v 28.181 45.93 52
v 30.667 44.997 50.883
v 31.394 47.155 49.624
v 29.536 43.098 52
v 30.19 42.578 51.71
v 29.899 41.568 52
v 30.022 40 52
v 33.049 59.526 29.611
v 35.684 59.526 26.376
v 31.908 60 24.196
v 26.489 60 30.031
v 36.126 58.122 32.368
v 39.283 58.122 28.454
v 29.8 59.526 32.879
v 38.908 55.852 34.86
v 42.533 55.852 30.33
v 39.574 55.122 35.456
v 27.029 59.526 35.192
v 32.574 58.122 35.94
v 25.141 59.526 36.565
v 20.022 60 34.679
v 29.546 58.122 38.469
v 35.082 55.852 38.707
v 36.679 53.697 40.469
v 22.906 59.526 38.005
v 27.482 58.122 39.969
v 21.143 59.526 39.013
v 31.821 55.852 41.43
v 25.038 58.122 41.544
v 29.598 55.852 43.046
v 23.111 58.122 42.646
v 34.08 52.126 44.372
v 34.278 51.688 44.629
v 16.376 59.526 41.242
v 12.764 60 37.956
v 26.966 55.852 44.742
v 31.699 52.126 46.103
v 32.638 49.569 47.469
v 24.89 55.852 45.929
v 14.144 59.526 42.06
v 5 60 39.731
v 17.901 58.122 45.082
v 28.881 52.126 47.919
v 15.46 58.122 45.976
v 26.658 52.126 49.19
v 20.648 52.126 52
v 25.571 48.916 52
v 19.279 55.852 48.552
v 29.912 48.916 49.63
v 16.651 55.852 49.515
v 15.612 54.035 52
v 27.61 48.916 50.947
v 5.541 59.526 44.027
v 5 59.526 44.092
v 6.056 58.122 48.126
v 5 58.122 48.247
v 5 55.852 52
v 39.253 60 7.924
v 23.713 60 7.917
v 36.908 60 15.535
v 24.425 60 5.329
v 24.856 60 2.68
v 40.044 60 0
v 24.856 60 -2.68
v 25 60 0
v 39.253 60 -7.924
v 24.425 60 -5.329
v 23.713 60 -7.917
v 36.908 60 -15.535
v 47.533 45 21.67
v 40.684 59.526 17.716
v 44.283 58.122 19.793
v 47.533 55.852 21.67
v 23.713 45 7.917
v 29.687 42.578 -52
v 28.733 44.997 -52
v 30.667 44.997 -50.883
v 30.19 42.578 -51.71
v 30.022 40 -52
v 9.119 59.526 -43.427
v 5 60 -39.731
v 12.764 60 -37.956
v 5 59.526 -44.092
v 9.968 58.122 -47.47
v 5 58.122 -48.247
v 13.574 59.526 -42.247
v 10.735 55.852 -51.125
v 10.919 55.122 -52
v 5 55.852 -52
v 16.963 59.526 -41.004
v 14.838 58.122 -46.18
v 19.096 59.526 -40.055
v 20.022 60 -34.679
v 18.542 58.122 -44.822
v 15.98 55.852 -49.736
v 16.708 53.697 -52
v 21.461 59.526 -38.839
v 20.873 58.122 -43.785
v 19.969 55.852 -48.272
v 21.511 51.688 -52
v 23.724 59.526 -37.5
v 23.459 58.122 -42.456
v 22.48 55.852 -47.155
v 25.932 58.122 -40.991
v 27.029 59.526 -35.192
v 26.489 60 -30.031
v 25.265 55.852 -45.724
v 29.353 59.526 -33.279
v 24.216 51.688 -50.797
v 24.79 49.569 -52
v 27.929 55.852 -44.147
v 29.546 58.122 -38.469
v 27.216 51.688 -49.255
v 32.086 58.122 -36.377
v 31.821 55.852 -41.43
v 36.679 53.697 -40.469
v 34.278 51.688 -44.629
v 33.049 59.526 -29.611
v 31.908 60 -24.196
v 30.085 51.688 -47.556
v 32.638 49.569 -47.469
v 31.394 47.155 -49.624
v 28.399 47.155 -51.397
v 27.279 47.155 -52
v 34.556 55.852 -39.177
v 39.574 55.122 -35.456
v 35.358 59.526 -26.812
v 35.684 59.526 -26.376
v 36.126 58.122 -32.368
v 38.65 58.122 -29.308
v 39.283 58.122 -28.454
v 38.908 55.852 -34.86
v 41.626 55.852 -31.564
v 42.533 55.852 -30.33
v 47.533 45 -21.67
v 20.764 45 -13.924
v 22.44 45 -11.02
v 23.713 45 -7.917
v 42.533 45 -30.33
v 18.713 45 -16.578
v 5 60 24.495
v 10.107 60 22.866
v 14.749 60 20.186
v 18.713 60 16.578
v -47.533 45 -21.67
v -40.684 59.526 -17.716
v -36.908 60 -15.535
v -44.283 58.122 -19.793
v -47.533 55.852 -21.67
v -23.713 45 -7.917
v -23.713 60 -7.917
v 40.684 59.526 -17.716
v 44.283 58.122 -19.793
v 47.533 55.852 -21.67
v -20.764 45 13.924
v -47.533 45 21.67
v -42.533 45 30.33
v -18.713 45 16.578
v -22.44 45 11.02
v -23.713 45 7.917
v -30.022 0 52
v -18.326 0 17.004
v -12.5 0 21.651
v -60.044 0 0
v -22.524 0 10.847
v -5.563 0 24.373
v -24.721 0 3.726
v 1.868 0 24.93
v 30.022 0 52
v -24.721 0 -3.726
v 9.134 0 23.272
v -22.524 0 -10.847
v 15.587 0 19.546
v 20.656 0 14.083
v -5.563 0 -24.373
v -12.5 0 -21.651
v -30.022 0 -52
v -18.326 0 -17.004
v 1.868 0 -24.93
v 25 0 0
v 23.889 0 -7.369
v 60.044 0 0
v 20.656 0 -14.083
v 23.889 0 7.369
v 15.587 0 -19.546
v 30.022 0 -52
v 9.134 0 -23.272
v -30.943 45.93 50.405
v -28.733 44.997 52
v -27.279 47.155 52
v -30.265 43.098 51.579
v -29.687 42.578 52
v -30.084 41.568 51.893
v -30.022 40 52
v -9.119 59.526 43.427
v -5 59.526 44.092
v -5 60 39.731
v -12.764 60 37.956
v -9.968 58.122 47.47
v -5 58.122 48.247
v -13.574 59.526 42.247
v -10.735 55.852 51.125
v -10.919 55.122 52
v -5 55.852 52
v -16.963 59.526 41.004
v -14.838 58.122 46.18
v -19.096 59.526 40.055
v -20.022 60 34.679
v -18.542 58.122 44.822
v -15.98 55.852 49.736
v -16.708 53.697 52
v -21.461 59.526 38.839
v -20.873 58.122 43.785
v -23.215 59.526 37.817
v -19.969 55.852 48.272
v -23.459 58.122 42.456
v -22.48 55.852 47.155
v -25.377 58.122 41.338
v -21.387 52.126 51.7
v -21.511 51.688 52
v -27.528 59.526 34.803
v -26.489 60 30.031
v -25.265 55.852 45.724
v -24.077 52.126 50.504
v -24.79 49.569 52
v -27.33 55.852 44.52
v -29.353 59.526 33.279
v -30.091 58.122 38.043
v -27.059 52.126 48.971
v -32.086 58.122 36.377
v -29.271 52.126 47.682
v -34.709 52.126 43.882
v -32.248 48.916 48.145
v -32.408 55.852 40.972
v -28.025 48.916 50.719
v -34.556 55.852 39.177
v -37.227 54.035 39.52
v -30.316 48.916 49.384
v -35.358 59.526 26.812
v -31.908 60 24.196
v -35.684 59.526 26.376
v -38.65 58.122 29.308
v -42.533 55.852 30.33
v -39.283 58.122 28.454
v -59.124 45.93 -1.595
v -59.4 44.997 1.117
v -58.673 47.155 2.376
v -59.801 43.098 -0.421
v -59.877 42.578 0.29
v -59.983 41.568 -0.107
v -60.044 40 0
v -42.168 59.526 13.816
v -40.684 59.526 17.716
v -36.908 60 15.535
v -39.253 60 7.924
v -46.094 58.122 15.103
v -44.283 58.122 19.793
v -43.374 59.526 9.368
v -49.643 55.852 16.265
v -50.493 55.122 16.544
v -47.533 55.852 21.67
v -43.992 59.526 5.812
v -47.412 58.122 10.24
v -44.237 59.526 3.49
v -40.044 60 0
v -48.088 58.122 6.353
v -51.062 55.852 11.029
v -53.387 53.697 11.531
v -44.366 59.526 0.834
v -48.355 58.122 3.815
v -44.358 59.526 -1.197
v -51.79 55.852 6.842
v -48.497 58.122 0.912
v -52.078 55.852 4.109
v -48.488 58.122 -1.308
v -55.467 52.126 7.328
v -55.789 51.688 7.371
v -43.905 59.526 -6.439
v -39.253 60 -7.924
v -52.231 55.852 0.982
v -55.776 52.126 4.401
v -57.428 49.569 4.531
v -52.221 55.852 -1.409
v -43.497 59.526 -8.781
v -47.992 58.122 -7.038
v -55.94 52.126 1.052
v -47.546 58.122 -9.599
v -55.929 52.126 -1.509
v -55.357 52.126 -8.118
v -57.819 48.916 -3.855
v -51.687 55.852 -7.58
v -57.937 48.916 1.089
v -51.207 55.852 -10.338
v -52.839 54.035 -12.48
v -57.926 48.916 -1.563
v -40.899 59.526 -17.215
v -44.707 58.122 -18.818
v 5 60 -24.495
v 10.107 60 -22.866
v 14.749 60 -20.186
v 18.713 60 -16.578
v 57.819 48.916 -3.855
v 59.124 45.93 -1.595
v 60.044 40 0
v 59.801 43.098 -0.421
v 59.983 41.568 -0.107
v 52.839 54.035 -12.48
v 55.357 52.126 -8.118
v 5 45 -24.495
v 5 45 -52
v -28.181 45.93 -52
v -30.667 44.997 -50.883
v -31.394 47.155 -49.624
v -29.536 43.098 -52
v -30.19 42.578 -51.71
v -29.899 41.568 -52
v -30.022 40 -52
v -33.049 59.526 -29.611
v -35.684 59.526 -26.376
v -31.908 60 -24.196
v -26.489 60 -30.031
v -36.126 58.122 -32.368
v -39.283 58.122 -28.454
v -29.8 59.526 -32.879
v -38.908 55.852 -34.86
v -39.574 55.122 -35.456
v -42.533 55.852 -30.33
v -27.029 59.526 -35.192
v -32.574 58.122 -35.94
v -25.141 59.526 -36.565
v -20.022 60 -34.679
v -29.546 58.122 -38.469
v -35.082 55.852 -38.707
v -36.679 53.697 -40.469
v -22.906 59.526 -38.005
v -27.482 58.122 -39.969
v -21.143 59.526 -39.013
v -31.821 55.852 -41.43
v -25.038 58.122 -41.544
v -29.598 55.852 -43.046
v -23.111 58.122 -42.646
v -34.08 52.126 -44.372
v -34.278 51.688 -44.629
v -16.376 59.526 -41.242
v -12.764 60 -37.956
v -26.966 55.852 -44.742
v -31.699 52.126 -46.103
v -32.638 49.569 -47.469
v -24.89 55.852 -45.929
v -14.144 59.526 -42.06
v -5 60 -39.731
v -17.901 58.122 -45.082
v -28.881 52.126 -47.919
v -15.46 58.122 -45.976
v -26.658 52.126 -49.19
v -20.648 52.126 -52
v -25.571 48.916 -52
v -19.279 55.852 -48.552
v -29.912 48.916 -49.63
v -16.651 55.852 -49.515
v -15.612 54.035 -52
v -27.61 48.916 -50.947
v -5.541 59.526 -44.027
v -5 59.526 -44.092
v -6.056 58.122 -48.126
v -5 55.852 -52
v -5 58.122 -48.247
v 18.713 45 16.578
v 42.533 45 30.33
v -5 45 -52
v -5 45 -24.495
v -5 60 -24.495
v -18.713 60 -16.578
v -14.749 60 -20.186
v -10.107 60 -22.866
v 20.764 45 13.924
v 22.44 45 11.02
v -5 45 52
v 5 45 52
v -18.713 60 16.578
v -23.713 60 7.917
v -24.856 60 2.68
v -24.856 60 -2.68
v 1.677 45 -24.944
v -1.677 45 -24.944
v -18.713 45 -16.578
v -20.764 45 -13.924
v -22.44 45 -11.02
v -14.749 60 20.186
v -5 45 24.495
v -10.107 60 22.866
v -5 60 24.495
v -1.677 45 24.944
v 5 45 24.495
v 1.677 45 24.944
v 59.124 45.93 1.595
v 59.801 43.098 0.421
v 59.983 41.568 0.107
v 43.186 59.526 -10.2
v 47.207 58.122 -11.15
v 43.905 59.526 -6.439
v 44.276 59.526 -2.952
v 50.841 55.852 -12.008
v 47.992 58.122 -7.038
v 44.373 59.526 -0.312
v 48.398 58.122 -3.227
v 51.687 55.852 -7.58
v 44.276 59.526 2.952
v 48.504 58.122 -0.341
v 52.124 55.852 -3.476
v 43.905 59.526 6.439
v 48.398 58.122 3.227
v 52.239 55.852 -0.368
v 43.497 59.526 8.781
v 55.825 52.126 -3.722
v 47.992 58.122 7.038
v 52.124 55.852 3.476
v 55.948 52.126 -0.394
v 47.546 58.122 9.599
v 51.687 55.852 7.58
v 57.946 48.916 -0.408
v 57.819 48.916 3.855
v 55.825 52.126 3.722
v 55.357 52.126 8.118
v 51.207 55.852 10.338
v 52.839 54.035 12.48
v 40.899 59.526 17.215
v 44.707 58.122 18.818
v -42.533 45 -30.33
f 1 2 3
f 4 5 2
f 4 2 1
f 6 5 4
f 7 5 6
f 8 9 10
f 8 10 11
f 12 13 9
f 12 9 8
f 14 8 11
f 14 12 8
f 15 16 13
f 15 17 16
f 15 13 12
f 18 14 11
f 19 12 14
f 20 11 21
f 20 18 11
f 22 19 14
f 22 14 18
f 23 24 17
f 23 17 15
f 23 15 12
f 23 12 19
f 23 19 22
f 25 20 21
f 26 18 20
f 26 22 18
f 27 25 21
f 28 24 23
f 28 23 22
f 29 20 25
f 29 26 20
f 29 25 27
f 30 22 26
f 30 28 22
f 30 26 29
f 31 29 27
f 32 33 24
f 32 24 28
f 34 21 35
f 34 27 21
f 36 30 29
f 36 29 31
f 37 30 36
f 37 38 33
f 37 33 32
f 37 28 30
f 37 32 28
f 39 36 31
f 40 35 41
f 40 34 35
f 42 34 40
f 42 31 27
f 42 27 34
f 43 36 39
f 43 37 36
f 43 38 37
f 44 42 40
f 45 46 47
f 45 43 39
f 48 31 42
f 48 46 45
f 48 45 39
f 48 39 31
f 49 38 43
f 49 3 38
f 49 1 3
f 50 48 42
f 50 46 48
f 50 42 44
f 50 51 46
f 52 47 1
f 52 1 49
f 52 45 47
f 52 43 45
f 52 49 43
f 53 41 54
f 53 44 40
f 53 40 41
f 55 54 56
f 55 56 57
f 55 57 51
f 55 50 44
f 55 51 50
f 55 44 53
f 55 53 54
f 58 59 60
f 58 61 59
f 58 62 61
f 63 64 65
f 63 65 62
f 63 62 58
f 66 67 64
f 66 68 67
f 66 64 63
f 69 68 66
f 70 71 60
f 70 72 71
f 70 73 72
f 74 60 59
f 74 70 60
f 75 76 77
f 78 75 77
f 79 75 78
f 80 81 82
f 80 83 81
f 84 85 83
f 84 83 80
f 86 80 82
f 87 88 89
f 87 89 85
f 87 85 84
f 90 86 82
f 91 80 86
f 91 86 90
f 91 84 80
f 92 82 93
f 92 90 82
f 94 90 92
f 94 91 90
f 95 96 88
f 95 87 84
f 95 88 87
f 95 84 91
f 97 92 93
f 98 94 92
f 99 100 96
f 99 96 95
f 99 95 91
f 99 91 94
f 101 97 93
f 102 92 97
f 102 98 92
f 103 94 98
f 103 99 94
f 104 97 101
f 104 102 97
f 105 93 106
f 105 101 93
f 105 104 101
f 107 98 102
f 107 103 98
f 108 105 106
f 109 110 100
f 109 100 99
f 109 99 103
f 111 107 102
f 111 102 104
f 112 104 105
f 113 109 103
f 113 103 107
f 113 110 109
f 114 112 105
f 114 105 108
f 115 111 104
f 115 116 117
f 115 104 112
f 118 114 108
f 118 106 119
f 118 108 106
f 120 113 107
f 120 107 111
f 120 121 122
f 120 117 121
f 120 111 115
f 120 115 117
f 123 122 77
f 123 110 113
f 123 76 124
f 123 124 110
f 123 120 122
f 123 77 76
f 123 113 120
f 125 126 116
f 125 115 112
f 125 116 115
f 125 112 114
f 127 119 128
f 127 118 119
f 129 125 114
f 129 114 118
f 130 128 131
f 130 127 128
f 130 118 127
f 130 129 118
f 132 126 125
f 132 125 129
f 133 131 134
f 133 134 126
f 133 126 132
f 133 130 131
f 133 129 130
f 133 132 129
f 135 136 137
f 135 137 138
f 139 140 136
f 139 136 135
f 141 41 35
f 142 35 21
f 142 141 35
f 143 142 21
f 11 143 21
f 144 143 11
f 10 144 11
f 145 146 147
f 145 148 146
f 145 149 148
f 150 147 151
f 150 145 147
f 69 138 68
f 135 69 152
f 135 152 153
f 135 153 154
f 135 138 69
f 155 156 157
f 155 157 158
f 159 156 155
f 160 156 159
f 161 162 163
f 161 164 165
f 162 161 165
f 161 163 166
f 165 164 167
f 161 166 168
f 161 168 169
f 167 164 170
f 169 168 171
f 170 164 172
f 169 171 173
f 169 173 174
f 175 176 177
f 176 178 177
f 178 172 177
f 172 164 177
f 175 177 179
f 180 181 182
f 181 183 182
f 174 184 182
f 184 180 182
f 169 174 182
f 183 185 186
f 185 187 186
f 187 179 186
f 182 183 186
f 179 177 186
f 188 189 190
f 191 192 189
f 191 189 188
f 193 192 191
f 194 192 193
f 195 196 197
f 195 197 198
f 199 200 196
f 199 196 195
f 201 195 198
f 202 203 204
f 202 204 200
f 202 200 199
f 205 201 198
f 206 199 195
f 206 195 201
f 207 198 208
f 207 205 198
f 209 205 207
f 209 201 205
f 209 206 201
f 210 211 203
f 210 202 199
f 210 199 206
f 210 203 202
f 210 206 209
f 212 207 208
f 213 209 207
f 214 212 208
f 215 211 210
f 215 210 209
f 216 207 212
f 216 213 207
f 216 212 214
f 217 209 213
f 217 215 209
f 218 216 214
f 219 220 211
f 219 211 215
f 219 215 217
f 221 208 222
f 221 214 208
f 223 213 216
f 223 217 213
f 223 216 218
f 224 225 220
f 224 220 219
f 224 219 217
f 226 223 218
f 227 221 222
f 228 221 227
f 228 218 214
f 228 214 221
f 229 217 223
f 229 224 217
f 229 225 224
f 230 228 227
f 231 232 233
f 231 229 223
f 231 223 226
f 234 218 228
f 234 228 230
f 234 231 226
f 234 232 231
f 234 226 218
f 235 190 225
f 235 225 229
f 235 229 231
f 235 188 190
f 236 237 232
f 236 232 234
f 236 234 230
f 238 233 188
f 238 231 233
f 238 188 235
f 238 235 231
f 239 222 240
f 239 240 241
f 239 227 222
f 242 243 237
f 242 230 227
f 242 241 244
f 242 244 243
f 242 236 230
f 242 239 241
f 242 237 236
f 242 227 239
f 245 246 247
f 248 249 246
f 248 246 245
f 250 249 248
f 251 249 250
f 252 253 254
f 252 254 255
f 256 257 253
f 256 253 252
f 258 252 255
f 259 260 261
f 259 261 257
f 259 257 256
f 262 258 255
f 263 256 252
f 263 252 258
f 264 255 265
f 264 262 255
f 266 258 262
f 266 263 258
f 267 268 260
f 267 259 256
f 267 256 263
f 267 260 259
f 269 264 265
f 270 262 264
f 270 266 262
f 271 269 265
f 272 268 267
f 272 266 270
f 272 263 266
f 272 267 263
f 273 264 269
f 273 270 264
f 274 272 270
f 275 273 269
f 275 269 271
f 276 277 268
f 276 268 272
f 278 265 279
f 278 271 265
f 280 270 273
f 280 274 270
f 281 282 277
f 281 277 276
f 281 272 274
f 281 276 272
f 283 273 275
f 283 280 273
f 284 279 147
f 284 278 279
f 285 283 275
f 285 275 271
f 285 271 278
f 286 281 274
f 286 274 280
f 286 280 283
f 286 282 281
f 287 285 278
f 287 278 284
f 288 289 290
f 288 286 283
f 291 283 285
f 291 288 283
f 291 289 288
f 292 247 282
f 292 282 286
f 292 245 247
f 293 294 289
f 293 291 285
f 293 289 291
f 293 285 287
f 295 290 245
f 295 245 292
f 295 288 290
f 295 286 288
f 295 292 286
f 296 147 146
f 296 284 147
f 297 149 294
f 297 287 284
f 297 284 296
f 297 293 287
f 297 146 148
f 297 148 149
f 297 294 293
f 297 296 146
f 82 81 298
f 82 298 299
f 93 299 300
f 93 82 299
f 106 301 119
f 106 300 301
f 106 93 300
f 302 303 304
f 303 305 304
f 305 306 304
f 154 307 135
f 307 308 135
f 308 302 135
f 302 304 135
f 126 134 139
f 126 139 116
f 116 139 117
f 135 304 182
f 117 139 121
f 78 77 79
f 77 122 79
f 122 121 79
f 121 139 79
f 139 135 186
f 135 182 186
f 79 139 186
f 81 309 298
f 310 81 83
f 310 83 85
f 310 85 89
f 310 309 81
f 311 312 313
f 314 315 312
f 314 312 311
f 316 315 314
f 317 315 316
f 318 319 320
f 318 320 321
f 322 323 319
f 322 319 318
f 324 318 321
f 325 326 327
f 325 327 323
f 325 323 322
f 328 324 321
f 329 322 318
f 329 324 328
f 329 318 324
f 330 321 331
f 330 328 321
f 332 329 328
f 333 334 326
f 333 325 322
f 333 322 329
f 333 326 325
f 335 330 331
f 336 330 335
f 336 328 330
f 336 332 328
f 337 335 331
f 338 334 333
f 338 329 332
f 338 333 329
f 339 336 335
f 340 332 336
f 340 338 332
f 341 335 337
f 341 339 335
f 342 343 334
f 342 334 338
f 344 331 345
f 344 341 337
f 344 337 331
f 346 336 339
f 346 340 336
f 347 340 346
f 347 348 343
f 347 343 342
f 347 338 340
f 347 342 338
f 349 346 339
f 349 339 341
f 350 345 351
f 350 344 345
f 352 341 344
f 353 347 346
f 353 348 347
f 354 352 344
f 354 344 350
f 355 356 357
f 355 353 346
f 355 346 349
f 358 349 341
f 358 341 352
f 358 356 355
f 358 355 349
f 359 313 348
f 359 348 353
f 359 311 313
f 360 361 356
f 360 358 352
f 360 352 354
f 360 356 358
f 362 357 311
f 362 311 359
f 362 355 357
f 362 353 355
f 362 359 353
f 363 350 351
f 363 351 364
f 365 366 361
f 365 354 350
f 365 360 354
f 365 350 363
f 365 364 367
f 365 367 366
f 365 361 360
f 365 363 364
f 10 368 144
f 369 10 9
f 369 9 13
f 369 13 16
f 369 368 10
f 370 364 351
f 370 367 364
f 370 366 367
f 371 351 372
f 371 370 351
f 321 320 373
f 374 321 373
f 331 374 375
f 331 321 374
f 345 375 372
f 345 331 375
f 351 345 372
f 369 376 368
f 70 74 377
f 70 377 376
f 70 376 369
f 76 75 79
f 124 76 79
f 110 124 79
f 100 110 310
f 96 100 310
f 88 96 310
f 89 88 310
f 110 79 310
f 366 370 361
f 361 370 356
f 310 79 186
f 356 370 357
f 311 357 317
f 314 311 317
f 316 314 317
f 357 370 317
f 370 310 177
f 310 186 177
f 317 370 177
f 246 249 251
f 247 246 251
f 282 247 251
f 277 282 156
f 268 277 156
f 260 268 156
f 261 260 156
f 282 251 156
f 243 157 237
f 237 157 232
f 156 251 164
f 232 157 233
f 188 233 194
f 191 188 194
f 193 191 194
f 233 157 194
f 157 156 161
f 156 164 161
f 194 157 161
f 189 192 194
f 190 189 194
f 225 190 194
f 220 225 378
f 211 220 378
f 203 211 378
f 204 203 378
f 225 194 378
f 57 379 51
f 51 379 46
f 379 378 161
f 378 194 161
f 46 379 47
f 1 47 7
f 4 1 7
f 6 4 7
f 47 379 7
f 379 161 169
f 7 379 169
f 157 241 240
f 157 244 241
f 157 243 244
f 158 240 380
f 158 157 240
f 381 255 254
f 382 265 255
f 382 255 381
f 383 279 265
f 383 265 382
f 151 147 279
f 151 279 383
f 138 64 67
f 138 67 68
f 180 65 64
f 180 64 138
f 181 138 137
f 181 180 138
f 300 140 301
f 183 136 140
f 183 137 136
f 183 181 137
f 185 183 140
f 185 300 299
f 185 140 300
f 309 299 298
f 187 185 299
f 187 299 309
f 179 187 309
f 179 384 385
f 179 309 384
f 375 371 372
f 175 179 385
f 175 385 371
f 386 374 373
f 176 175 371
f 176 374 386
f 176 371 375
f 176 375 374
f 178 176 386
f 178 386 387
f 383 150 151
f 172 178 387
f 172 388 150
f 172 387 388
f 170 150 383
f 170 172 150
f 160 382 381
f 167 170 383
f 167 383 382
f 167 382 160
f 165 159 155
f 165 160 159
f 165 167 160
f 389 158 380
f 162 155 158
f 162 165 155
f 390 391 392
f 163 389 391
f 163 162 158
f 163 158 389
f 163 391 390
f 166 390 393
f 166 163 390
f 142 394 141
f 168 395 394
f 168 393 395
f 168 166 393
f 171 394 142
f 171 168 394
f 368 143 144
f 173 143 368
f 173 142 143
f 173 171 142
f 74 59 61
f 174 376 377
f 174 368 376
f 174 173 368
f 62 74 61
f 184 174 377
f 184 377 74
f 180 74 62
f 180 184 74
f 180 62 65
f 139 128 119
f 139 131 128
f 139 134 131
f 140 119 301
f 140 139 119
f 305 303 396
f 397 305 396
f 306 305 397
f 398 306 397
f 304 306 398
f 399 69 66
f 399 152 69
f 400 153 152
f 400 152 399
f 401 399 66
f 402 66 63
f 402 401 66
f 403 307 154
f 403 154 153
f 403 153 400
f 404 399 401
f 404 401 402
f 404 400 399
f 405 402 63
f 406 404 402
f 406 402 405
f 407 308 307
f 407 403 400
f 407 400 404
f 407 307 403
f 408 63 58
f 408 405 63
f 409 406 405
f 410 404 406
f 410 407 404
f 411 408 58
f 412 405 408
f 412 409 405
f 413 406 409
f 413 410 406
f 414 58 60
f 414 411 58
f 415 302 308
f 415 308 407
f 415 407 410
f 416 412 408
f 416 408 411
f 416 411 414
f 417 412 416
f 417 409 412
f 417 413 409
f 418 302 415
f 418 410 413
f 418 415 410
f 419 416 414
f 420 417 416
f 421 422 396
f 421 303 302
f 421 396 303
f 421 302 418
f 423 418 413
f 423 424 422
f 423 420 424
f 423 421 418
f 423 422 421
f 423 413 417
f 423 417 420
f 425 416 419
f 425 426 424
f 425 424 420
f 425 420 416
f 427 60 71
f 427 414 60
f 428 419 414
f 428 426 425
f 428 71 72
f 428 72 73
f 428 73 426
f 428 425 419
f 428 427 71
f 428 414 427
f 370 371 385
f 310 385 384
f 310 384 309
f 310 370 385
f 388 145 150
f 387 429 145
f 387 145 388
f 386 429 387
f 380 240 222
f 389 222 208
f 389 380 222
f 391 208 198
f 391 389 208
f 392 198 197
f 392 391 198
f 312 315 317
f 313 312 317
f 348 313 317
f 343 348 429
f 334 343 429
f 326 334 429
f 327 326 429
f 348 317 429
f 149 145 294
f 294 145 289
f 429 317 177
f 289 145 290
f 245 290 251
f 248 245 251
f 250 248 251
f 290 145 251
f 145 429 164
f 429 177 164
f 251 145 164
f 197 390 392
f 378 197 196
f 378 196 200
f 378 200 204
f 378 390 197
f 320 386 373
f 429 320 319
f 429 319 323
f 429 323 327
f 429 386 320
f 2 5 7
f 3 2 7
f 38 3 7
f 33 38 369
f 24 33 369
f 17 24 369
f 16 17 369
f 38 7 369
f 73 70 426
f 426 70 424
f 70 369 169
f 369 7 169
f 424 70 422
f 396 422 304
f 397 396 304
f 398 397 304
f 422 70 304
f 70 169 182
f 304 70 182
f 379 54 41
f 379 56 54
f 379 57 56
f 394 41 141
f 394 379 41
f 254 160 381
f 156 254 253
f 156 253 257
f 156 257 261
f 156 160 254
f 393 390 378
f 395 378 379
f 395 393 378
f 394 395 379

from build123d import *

# Parameters (mm, degrees)
SKETCH1_R           = 25
BOSS_EXTRUDE1_DEPTH = 60
CUT_EXTRUDE1_REACH  = 107
CUT_EXTRUDE1_START  = 45


with BuildPart() as part:
    # Sketch1 → Boss-Extrude1 (new body)
    with BuildSketch(Plane(origin=(0, 0, 0), x_dir=(1, 0, 0), z_dir=(0, 1, 0))):
        Polygon((60.044427996, 0), (30.022213998, 52), (-30.022213998, 52), (-60.044427996, 0), (-30.022213998, -52), (30.022213998, -52), align=None)
        Circle(SKETCH1_R, mode=Mode.SUBTRACT)
    extrude(amount=BOSS_EXTRUDE1_DEPTH)

    # Sketch2 → Cut-Extrude1 (cut, up to next)
    with BuildSketch(Plane(origin=(0, 0, 0), x_dir=(1, 0, 0), z_dir=(0, 1, 0)).offset(CUT_EXTRUDE1_START), mode=Mode.PRIVATE) as cut_extrude1_sk1:
        with BuildLine():
            Line((-47.533320997, -21.669872981), (-42.533320997, -30.330127019))
            Line((-42.533320997, -30.330127019), (-18.713203436, -16.577575733))
            ThreePointArc((-18.713203436, -16.577575733), (-21.650635095, -12.5), (-23.713203436, -7.917321695))
            Line((-23.713203436, -7.917321695), (-47.533320997, -21.669872981))
        make_face()
    cut_extrude1_tool1 = extrude(cut_extrude1_sk1.sketch, amount=CUT_EXTRUDE1_REACH, mode=Mode.PRIVATE) & part.part
    add(cut_extrude1_tool1.solids().sort_by_distance((-33.26901, 45, 19.207872))[0], mode=Mode.SUBTRACT)
    # Sketch2 → Cut-Extrude1 (cut, up to next)
    with BuildSketch(Plane(origin=(0, 0, 0), x_dir=(1, 0, 0), z_dir=(0, 1, 0)).offset(CUT_EXTRUDE1_START), mode=Mode.PRIVATE) as cut_extrude1_sk2:
        with BuildLine():
            Line((-5, -52), (5, -52))
            Line((5, -52), (5, -24.494897428))
            ThreePointArc((5, -24.494897428), (0, -25), (-5, -24.494897428))
            Line((-5, -24.494897428), (-5, -52))
        make_face()
    cut_extrude1_tool2 = extrude(cut_extrude1_sk2.sketch, amount=CUT_EXTRUDE1_REACH, mode=Mode.PRIVATE) & part.part
    add(cut_extrude1_tool2.solids().sort_by_distance((0, 45, 38.415743))[0], mode=Mode.SUBTRACT)
    # Sketch2 → Cut-Extrude1 (cut, up to next)
    with BuildSketch(Plane(origin=(0, 0, 0), x_dir=(1, 0, 0), z_dir=(0, 1, 0)).offset(CUT_EXTRUDE1_START), mode=Mode.PRIVATE) as cut_extrude1_sk3:
        with BuildLine():
            Line((42.533320997, -30.330127019), (47.533320997, -21.669872981))
            Line((47.533320997, -21.669872981), (23.713203436, -7.917321695))
            ThreePointArc((23.713203436, -7.917321695), (21.650635095, -12.5), (18.713203436, -16.577575733))
            Line((18.713203436, -16.577575733), (42.533320997, -30.330127019))
        make_face()
    cut_extrude1_tool3 = extrude(cut_extrude1_sk3.sketch, amount=CUT_EXTRUDE1_REACH, mode=Mode.PRIVATE) & part.part
    add(cut_extrude1_tool3.solids().sort_by_distance((33.26901, 45, 19.207872))[0], mode=Mode.SUBTRACT)
    # Sketch2 → Cut-Extrude1 (cut, up to next)
    with BuildSketch(Plane(origin=(0, 0, 0), x_dir=(1, 0, 0), z_dir=(0, 1, 0)).offset(CUT_EXTRUDE1_START), mode=Mode.PRIVATE) as cut_extrude1_sk4:
        with BuildLine():
            Line((47.533320997, 21.669872981), (42.533320997, 30.330127019))
            Line((42.533320997, 30.330127019), (18.713203436, 16.577575733))
            ThreePointArc((18.713203436, 16.577575733), (21.650635095, 12.5), (23.713203436, 7.917321695))
            Line((23.713203436, 7.917321695), (47.533320997, 21.669872981))
        make_face()
    cut_extrude1_tool4 = extrude(cut_extrude1_sk4.sketch, amount=CUT_EXTRUDE1_REACH, mode=Mode.PRIVATE) & part.part
    add(cut_extrude1_tool4.solids().sort_by_distance((33.26901, 45, -19.207872))[0], mode=Mode.SUBTRACT)
    # Sketch2 → Cut-Extrude1 (cut, up to next)
    with BuildSketch(Plane(origin=(0, 0, 0), x_dir=(1, 0, 0), z_dir=(0, 1, 0)).offset(CUT_EXTRUDE1_START), mode=Mode.PRIVATE) as cut_extrude1_sk5:
        with BuildLine():
            Line((5, 52), (-5, 52))
            Line((-5, 52), (-5, 24.494897428))
            ThreePointArc((-5, 24.494897428), (0, 25), (5, 24.494897428))
            Line((5, 24.494897428), (5, 52))
        make_face()
    cut_extrude1_tool5 = extrude(cut_extrude1_sk5.sketch, amount=CUT_EXTRUDE1_REACH, mode=Mode.PRIVATE) & part.part
    add(cut_extrude1_tool5.solids().sort_by_distance((0, 45, -38.415743))[0], mode=Mode.SUBTRACT)
    # Sketch2 → Cut-Extrude1 (cut, up to next)
    with BuildSketch(Plane(origin=(0, 0, 0), x_dir=(1, 0, 0), z_dir=(0, 1, 0)).offset(CUT_EXTRUDE1_START), mode=Mode.PRIVATE) as cut_extrude1_sk6:
        with BuildLine():
            Line((-42.533320997, 30.330127019), (-47.533320997, 21.669872981))
            Line((-47.533320997, 21.669872981), (-23.713203436, 7.917321695))
            ThreePointArc((-23.713203436, 7.917321695), (-21.650635095, 12.5), (-18.713203436, 16.577575733))
            Line((-18.713203436, 16.577575733), (-42.533320997, 30.330127019))
        make_face()
    cut_extrude1_tool6 = extrude(cut_extrude1_sk6.sketch, amount=CUT_EXTRUDE1_REACH, mode=Mode.PRIVATE) & part.part
    add(cut_extrude1_tool6.solids().sort_by_distance((-33.26901, 45, -19.207872))[0], mode=Mode.SUBTRACT)

    # Sketch3 → Cut-Revolve1 (revolve, cut)
    with BuildSketch(Plane.XY):
        with BuildLine():
            Line((60.044427996, 40), (60.044427996, 60))
            Line((60.044427996, 60), (40.044427996, 60))
            ThreePointArc((40.044427996, 60), (54.186563619, 54.142135624), (60.044427996, 40))
        make_face()
    revolve(axis=Axis((0, 0, 0), (0, -1, 0)), mode=Mode.SUBTRACT)


solid = part.part
